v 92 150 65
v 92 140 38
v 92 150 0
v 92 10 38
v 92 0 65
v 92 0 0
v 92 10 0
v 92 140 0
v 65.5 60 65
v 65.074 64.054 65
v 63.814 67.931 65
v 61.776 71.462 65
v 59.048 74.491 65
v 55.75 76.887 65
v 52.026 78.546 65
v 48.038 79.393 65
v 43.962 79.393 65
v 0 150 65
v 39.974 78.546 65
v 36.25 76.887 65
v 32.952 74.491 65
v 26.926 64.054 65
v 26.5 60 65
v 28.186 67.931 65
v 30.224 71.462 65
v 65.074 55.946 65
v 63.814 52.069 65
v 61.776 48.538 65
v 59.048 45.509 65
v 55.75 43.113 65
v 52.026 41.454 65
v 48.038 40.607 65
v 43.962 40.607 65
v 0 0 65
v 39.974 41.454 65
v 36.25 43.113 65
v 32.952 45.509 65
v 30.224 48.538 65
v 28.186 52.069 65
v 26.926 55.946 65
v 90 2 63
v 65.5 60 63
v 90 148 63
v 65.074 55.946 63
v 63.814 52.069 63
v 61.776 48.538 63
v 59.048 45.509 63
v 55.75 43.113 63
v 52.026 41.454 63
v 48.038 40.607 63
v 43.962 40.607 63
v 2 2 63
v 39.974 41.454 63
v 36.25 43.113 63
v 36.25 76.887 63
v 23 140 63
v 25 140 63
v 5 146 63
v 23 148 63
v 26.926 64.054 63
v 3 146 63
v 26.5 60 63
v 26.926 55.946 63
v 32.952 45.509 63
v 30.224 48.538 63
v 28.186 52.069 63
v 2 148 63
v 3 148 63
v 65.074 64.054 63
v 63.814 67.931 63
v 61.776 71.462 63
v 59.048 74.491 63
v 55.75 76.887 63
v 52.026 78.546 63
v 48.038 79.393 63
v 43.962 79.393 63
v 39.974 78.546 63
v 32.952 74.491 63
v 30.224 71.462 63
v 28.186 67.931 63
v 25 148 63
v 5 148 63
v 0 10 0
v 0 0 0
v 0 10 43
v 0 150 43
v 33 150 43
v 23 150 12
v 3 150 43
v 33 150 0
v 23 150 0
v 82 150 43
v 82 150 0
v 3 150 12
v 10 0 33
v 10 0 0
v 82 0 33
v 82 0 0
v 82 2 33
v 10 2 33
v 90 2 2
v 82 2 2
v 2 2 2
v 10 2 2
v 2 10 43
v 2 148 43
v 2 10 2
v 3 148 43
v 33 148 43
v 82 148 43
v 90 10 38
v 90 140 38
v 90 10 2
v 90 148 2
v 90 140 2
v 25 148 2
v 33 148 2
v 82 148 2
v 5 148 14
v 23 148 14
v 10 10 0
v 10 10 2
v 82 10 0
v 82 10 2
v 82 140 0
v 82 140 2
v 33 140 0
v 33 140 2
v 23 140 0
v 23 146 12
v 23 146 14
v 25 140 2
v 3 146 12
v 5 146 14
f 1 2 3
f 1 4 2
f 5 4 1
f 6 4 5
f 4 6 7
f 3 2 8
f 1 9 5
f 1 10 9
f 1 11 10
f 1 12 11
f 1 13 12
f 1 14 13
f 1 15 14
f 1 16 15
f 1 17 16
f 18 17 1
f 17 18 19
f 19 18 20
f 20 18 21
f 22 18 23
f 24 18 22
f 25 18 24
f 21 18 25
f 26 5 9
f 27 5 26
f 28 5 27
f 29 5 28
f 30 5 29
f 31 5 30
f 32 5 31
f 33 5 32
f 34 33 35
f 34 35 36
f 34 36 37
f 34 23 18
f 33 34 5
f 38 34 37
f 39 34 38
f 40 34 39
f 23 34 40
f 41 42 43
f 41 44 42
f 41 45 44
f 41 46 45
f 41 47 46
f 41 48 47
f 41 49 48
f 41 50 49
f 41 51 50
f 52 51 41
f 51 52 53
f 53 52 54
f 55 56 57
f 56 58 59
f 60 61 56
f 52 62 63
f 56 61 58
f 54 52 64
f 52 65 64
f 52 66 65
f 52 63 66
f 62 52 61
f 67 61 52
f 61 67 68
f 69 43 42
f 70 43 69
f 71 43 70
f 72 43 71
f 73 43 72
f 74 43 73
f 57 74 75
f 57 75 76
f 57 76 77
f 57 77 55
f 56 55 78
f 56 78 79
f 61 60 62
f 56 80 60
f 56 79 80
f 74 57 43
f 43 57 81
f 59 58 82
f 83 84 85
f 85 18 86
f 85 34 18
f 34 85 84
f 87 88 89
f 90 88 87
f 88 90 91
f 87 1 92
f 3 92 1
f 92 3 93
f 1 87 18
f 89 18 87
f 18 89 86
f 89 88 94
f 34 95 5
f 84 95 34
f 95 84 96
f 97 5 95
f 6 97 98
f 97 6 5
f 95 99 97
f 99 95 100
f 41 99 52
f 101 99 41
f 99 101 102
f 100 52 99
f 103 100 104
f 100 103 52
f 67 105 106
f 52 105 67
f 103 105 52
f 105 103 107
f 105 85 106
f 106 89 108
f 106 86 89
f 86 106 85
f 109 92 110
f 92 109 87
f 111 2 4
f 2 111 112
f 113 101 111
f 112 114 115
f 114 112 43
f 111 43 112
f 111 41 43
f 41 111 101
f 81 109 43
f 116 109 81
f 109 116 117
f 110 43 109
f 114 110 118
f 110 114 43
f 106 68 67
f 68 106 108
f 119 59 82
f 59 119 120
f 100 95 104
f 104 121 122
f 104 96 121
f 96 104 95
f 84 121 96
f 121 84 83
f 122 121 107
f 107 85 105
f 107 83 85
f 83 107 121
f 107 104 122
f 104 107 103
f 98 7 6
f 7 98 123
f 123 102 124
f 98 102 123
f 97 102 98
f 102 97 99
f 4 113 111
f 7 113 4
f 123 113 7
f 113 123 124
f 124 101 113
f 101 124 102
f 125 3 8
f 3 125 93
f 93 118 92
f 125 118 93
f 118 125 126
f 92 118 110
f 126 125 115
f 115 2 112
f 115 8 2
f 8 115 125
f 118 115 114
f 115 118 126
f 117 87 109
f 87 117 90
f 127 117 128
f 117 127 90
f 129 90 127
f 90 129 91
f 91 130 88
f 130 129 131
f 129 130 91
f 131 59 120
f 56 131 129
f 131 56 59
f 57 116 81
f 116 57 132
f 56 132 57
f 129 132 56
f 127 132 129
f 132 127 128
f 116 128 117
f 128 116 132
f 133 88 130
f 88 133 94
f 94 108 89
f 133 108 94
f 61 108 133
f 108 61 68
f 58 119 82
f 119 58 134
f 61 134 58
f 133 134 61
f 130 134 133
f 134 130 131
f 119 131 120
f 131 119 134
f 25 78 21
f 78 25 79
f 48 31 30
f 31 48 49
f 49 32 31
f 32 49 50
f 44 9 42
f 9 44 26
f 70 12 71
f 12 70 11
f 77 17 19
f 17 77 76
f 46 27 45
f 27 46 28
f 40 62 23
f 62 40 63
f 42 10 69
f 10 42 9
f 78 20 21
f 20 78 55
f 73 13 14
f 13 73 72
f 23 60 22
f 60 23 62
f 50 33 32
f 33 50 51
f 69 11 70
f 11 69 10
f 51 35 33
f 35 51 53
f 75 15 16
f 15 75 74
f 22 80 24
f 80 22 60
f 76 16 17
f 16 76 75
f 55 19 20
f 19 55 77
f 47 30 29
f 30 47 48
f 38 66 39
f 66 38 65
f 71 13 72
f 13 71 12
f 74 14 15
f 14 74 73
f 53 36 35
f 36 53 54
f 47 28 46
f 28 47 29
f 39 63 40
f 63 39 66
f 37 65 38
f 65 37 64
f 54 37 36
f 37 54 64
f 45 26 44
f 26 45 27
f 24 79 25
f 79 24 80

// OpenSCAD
difference()
{
union()
{
    // deck 
    translate([0,0,63])
      cube([92,150,2]);
    // sides
    translate([0,0,33])
      cube([92,2,30]);
    translate([0,0,43])
      cube([2,150,20]);
    translate([90,0,38])
      cube([2,150,25]);
    translate([0,148,43])
      cube([92,2,20]);
    // supports
    translate([0,0,0])
      cube([10,2,63]);
    translate([0,0,0])
      cube([2,10,63]);
    translate([0,0,0])
      cube([10,10,2]);
    
    translate([82,0,0])
      cube([10,2,63]);
    translate([90,0,0])
      cube([2,10,63]);
    translate([82,0,0])
      cube([10,10,2]);
    
    translate([82,148,0])
      cube([10,2,63]);
    translate([90,140,0])
      cube([2,10,63]);
    translate([82,140,0])
      cube([10,10,2]);
    
    translate([23,148,0])
      cube([10,2,63]);
    translate([23,140,0])
      cube([2,10,63]);
    translate([23,140,0])
      cube([10,10,2]);

    translate([3,148,12])
      cube([20,2,51]);
    translate([3,146,12])
      cube([2,4,51]);
    translate([3,146,12])
      cube([20,4,2]);
}      
union()
{
    translate([46,60,62])
      cylinder(r=39/2, h=4);
}
}
